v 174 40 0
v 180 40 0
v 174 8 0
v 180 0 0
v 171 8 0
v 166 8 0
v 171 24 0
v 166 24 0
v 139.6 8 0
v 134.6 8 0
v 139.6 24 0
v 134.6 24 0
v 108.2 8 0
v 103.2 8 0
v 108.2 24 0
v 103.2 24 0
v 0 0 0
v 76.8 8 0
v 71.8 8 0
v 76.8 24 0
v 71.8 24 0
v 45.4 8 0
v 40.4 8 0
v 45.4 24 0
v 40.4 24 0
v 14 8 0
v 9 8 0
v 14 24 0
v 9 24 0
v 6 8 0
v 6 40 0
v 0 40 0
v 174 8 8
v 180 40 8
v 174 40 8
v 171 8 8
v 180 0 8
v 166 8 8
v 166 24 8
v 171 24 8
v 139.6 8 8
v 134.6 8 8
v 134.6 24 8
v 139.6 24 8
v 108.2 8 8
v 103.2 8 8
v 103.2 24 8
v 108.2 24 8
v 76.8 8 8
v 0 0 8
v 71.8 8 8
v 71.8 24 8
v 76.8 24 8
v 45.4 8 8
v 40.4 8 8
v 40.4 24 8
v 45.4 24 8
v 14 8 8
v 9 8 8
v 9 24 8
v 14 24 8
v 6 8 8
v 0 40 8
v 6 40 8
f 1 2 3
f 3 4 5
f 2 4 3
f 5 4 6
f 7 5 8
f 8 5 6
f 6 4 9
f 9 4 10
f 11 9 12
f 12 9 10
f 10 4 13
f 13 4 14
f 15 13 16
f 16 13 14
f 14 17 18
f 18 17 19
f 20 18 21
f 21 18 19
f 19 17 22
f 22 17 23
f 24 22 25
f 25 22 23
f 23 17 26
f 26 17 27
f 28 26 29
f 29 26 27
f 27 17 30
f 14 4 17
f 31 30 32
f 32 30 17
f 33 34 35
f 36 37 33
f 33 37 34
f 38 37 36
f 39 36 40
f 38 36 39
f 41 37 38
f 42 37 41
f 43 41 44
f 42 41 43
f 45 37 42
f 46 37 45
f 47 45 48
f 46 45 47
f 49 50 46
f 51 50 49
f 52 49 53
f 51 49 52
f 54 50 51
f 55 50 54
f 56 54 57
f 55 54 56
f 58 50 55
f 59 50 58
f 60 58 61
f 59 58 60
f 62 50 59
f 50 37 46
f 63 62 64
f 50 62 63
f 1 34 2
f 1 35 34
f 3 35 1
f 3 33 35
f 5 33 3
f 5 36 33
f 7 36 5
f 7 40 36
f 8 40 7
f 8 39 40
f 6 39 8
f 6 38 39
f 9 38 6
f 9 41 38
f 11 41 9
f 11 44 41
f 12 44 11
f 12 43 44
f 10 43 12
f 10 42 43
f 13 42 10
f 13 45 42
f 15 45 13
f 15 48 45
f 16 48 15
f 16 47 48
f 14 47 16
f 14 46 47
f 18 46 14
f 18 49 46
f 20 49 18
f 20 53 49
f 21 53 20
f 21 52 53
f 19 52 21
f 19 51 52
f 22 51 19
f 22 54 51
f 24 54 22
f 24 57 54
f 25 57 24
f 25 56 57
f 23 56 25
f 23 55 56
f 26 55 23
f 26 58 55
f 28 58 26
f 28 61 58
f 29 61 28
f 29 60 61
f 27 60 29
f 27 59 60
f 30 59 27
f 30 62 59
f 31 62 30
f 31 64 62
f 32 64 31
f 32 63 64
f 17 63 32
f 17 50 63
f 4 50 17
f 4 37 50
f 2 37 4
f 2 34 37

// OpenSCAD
$fn = 32;

// ----------------------------------------------------------------------
// Guard grille: 6 slats over a 180 x 40 mm plate
// ----------------------------------------------------------------------

// --- parameters (mm) ---
profile_height = 8;       // extrusion height
profile_points = 32;      // points of the closed outline

profile = [[0, 0], [180, 0], [180, 40], [174, 40], [174, 8], [171, 8], [171, 24], [166, 24], [166, 8], [139.6, 8], [139.6, 24], [134.6, 24], [134.6, 8], [108.2, 8], [108.2, 24], [103.2, 24], [103.2, 8], [76.8, 8], [76.8, 24], [71.8, 24], [71.8, 8], [45.4, 8], [45.4, 24], [40.4, 24], [40.4, 8], [14, 8], [14, 24], [9, 24], [9, 8], [6, 8], [6, 40], [0, 40]];  // single closed polygon, 32 points, counter clockwise

// --- the one profile operation ---
linear_extrude(height = profile_height) polygon(points = profile);
